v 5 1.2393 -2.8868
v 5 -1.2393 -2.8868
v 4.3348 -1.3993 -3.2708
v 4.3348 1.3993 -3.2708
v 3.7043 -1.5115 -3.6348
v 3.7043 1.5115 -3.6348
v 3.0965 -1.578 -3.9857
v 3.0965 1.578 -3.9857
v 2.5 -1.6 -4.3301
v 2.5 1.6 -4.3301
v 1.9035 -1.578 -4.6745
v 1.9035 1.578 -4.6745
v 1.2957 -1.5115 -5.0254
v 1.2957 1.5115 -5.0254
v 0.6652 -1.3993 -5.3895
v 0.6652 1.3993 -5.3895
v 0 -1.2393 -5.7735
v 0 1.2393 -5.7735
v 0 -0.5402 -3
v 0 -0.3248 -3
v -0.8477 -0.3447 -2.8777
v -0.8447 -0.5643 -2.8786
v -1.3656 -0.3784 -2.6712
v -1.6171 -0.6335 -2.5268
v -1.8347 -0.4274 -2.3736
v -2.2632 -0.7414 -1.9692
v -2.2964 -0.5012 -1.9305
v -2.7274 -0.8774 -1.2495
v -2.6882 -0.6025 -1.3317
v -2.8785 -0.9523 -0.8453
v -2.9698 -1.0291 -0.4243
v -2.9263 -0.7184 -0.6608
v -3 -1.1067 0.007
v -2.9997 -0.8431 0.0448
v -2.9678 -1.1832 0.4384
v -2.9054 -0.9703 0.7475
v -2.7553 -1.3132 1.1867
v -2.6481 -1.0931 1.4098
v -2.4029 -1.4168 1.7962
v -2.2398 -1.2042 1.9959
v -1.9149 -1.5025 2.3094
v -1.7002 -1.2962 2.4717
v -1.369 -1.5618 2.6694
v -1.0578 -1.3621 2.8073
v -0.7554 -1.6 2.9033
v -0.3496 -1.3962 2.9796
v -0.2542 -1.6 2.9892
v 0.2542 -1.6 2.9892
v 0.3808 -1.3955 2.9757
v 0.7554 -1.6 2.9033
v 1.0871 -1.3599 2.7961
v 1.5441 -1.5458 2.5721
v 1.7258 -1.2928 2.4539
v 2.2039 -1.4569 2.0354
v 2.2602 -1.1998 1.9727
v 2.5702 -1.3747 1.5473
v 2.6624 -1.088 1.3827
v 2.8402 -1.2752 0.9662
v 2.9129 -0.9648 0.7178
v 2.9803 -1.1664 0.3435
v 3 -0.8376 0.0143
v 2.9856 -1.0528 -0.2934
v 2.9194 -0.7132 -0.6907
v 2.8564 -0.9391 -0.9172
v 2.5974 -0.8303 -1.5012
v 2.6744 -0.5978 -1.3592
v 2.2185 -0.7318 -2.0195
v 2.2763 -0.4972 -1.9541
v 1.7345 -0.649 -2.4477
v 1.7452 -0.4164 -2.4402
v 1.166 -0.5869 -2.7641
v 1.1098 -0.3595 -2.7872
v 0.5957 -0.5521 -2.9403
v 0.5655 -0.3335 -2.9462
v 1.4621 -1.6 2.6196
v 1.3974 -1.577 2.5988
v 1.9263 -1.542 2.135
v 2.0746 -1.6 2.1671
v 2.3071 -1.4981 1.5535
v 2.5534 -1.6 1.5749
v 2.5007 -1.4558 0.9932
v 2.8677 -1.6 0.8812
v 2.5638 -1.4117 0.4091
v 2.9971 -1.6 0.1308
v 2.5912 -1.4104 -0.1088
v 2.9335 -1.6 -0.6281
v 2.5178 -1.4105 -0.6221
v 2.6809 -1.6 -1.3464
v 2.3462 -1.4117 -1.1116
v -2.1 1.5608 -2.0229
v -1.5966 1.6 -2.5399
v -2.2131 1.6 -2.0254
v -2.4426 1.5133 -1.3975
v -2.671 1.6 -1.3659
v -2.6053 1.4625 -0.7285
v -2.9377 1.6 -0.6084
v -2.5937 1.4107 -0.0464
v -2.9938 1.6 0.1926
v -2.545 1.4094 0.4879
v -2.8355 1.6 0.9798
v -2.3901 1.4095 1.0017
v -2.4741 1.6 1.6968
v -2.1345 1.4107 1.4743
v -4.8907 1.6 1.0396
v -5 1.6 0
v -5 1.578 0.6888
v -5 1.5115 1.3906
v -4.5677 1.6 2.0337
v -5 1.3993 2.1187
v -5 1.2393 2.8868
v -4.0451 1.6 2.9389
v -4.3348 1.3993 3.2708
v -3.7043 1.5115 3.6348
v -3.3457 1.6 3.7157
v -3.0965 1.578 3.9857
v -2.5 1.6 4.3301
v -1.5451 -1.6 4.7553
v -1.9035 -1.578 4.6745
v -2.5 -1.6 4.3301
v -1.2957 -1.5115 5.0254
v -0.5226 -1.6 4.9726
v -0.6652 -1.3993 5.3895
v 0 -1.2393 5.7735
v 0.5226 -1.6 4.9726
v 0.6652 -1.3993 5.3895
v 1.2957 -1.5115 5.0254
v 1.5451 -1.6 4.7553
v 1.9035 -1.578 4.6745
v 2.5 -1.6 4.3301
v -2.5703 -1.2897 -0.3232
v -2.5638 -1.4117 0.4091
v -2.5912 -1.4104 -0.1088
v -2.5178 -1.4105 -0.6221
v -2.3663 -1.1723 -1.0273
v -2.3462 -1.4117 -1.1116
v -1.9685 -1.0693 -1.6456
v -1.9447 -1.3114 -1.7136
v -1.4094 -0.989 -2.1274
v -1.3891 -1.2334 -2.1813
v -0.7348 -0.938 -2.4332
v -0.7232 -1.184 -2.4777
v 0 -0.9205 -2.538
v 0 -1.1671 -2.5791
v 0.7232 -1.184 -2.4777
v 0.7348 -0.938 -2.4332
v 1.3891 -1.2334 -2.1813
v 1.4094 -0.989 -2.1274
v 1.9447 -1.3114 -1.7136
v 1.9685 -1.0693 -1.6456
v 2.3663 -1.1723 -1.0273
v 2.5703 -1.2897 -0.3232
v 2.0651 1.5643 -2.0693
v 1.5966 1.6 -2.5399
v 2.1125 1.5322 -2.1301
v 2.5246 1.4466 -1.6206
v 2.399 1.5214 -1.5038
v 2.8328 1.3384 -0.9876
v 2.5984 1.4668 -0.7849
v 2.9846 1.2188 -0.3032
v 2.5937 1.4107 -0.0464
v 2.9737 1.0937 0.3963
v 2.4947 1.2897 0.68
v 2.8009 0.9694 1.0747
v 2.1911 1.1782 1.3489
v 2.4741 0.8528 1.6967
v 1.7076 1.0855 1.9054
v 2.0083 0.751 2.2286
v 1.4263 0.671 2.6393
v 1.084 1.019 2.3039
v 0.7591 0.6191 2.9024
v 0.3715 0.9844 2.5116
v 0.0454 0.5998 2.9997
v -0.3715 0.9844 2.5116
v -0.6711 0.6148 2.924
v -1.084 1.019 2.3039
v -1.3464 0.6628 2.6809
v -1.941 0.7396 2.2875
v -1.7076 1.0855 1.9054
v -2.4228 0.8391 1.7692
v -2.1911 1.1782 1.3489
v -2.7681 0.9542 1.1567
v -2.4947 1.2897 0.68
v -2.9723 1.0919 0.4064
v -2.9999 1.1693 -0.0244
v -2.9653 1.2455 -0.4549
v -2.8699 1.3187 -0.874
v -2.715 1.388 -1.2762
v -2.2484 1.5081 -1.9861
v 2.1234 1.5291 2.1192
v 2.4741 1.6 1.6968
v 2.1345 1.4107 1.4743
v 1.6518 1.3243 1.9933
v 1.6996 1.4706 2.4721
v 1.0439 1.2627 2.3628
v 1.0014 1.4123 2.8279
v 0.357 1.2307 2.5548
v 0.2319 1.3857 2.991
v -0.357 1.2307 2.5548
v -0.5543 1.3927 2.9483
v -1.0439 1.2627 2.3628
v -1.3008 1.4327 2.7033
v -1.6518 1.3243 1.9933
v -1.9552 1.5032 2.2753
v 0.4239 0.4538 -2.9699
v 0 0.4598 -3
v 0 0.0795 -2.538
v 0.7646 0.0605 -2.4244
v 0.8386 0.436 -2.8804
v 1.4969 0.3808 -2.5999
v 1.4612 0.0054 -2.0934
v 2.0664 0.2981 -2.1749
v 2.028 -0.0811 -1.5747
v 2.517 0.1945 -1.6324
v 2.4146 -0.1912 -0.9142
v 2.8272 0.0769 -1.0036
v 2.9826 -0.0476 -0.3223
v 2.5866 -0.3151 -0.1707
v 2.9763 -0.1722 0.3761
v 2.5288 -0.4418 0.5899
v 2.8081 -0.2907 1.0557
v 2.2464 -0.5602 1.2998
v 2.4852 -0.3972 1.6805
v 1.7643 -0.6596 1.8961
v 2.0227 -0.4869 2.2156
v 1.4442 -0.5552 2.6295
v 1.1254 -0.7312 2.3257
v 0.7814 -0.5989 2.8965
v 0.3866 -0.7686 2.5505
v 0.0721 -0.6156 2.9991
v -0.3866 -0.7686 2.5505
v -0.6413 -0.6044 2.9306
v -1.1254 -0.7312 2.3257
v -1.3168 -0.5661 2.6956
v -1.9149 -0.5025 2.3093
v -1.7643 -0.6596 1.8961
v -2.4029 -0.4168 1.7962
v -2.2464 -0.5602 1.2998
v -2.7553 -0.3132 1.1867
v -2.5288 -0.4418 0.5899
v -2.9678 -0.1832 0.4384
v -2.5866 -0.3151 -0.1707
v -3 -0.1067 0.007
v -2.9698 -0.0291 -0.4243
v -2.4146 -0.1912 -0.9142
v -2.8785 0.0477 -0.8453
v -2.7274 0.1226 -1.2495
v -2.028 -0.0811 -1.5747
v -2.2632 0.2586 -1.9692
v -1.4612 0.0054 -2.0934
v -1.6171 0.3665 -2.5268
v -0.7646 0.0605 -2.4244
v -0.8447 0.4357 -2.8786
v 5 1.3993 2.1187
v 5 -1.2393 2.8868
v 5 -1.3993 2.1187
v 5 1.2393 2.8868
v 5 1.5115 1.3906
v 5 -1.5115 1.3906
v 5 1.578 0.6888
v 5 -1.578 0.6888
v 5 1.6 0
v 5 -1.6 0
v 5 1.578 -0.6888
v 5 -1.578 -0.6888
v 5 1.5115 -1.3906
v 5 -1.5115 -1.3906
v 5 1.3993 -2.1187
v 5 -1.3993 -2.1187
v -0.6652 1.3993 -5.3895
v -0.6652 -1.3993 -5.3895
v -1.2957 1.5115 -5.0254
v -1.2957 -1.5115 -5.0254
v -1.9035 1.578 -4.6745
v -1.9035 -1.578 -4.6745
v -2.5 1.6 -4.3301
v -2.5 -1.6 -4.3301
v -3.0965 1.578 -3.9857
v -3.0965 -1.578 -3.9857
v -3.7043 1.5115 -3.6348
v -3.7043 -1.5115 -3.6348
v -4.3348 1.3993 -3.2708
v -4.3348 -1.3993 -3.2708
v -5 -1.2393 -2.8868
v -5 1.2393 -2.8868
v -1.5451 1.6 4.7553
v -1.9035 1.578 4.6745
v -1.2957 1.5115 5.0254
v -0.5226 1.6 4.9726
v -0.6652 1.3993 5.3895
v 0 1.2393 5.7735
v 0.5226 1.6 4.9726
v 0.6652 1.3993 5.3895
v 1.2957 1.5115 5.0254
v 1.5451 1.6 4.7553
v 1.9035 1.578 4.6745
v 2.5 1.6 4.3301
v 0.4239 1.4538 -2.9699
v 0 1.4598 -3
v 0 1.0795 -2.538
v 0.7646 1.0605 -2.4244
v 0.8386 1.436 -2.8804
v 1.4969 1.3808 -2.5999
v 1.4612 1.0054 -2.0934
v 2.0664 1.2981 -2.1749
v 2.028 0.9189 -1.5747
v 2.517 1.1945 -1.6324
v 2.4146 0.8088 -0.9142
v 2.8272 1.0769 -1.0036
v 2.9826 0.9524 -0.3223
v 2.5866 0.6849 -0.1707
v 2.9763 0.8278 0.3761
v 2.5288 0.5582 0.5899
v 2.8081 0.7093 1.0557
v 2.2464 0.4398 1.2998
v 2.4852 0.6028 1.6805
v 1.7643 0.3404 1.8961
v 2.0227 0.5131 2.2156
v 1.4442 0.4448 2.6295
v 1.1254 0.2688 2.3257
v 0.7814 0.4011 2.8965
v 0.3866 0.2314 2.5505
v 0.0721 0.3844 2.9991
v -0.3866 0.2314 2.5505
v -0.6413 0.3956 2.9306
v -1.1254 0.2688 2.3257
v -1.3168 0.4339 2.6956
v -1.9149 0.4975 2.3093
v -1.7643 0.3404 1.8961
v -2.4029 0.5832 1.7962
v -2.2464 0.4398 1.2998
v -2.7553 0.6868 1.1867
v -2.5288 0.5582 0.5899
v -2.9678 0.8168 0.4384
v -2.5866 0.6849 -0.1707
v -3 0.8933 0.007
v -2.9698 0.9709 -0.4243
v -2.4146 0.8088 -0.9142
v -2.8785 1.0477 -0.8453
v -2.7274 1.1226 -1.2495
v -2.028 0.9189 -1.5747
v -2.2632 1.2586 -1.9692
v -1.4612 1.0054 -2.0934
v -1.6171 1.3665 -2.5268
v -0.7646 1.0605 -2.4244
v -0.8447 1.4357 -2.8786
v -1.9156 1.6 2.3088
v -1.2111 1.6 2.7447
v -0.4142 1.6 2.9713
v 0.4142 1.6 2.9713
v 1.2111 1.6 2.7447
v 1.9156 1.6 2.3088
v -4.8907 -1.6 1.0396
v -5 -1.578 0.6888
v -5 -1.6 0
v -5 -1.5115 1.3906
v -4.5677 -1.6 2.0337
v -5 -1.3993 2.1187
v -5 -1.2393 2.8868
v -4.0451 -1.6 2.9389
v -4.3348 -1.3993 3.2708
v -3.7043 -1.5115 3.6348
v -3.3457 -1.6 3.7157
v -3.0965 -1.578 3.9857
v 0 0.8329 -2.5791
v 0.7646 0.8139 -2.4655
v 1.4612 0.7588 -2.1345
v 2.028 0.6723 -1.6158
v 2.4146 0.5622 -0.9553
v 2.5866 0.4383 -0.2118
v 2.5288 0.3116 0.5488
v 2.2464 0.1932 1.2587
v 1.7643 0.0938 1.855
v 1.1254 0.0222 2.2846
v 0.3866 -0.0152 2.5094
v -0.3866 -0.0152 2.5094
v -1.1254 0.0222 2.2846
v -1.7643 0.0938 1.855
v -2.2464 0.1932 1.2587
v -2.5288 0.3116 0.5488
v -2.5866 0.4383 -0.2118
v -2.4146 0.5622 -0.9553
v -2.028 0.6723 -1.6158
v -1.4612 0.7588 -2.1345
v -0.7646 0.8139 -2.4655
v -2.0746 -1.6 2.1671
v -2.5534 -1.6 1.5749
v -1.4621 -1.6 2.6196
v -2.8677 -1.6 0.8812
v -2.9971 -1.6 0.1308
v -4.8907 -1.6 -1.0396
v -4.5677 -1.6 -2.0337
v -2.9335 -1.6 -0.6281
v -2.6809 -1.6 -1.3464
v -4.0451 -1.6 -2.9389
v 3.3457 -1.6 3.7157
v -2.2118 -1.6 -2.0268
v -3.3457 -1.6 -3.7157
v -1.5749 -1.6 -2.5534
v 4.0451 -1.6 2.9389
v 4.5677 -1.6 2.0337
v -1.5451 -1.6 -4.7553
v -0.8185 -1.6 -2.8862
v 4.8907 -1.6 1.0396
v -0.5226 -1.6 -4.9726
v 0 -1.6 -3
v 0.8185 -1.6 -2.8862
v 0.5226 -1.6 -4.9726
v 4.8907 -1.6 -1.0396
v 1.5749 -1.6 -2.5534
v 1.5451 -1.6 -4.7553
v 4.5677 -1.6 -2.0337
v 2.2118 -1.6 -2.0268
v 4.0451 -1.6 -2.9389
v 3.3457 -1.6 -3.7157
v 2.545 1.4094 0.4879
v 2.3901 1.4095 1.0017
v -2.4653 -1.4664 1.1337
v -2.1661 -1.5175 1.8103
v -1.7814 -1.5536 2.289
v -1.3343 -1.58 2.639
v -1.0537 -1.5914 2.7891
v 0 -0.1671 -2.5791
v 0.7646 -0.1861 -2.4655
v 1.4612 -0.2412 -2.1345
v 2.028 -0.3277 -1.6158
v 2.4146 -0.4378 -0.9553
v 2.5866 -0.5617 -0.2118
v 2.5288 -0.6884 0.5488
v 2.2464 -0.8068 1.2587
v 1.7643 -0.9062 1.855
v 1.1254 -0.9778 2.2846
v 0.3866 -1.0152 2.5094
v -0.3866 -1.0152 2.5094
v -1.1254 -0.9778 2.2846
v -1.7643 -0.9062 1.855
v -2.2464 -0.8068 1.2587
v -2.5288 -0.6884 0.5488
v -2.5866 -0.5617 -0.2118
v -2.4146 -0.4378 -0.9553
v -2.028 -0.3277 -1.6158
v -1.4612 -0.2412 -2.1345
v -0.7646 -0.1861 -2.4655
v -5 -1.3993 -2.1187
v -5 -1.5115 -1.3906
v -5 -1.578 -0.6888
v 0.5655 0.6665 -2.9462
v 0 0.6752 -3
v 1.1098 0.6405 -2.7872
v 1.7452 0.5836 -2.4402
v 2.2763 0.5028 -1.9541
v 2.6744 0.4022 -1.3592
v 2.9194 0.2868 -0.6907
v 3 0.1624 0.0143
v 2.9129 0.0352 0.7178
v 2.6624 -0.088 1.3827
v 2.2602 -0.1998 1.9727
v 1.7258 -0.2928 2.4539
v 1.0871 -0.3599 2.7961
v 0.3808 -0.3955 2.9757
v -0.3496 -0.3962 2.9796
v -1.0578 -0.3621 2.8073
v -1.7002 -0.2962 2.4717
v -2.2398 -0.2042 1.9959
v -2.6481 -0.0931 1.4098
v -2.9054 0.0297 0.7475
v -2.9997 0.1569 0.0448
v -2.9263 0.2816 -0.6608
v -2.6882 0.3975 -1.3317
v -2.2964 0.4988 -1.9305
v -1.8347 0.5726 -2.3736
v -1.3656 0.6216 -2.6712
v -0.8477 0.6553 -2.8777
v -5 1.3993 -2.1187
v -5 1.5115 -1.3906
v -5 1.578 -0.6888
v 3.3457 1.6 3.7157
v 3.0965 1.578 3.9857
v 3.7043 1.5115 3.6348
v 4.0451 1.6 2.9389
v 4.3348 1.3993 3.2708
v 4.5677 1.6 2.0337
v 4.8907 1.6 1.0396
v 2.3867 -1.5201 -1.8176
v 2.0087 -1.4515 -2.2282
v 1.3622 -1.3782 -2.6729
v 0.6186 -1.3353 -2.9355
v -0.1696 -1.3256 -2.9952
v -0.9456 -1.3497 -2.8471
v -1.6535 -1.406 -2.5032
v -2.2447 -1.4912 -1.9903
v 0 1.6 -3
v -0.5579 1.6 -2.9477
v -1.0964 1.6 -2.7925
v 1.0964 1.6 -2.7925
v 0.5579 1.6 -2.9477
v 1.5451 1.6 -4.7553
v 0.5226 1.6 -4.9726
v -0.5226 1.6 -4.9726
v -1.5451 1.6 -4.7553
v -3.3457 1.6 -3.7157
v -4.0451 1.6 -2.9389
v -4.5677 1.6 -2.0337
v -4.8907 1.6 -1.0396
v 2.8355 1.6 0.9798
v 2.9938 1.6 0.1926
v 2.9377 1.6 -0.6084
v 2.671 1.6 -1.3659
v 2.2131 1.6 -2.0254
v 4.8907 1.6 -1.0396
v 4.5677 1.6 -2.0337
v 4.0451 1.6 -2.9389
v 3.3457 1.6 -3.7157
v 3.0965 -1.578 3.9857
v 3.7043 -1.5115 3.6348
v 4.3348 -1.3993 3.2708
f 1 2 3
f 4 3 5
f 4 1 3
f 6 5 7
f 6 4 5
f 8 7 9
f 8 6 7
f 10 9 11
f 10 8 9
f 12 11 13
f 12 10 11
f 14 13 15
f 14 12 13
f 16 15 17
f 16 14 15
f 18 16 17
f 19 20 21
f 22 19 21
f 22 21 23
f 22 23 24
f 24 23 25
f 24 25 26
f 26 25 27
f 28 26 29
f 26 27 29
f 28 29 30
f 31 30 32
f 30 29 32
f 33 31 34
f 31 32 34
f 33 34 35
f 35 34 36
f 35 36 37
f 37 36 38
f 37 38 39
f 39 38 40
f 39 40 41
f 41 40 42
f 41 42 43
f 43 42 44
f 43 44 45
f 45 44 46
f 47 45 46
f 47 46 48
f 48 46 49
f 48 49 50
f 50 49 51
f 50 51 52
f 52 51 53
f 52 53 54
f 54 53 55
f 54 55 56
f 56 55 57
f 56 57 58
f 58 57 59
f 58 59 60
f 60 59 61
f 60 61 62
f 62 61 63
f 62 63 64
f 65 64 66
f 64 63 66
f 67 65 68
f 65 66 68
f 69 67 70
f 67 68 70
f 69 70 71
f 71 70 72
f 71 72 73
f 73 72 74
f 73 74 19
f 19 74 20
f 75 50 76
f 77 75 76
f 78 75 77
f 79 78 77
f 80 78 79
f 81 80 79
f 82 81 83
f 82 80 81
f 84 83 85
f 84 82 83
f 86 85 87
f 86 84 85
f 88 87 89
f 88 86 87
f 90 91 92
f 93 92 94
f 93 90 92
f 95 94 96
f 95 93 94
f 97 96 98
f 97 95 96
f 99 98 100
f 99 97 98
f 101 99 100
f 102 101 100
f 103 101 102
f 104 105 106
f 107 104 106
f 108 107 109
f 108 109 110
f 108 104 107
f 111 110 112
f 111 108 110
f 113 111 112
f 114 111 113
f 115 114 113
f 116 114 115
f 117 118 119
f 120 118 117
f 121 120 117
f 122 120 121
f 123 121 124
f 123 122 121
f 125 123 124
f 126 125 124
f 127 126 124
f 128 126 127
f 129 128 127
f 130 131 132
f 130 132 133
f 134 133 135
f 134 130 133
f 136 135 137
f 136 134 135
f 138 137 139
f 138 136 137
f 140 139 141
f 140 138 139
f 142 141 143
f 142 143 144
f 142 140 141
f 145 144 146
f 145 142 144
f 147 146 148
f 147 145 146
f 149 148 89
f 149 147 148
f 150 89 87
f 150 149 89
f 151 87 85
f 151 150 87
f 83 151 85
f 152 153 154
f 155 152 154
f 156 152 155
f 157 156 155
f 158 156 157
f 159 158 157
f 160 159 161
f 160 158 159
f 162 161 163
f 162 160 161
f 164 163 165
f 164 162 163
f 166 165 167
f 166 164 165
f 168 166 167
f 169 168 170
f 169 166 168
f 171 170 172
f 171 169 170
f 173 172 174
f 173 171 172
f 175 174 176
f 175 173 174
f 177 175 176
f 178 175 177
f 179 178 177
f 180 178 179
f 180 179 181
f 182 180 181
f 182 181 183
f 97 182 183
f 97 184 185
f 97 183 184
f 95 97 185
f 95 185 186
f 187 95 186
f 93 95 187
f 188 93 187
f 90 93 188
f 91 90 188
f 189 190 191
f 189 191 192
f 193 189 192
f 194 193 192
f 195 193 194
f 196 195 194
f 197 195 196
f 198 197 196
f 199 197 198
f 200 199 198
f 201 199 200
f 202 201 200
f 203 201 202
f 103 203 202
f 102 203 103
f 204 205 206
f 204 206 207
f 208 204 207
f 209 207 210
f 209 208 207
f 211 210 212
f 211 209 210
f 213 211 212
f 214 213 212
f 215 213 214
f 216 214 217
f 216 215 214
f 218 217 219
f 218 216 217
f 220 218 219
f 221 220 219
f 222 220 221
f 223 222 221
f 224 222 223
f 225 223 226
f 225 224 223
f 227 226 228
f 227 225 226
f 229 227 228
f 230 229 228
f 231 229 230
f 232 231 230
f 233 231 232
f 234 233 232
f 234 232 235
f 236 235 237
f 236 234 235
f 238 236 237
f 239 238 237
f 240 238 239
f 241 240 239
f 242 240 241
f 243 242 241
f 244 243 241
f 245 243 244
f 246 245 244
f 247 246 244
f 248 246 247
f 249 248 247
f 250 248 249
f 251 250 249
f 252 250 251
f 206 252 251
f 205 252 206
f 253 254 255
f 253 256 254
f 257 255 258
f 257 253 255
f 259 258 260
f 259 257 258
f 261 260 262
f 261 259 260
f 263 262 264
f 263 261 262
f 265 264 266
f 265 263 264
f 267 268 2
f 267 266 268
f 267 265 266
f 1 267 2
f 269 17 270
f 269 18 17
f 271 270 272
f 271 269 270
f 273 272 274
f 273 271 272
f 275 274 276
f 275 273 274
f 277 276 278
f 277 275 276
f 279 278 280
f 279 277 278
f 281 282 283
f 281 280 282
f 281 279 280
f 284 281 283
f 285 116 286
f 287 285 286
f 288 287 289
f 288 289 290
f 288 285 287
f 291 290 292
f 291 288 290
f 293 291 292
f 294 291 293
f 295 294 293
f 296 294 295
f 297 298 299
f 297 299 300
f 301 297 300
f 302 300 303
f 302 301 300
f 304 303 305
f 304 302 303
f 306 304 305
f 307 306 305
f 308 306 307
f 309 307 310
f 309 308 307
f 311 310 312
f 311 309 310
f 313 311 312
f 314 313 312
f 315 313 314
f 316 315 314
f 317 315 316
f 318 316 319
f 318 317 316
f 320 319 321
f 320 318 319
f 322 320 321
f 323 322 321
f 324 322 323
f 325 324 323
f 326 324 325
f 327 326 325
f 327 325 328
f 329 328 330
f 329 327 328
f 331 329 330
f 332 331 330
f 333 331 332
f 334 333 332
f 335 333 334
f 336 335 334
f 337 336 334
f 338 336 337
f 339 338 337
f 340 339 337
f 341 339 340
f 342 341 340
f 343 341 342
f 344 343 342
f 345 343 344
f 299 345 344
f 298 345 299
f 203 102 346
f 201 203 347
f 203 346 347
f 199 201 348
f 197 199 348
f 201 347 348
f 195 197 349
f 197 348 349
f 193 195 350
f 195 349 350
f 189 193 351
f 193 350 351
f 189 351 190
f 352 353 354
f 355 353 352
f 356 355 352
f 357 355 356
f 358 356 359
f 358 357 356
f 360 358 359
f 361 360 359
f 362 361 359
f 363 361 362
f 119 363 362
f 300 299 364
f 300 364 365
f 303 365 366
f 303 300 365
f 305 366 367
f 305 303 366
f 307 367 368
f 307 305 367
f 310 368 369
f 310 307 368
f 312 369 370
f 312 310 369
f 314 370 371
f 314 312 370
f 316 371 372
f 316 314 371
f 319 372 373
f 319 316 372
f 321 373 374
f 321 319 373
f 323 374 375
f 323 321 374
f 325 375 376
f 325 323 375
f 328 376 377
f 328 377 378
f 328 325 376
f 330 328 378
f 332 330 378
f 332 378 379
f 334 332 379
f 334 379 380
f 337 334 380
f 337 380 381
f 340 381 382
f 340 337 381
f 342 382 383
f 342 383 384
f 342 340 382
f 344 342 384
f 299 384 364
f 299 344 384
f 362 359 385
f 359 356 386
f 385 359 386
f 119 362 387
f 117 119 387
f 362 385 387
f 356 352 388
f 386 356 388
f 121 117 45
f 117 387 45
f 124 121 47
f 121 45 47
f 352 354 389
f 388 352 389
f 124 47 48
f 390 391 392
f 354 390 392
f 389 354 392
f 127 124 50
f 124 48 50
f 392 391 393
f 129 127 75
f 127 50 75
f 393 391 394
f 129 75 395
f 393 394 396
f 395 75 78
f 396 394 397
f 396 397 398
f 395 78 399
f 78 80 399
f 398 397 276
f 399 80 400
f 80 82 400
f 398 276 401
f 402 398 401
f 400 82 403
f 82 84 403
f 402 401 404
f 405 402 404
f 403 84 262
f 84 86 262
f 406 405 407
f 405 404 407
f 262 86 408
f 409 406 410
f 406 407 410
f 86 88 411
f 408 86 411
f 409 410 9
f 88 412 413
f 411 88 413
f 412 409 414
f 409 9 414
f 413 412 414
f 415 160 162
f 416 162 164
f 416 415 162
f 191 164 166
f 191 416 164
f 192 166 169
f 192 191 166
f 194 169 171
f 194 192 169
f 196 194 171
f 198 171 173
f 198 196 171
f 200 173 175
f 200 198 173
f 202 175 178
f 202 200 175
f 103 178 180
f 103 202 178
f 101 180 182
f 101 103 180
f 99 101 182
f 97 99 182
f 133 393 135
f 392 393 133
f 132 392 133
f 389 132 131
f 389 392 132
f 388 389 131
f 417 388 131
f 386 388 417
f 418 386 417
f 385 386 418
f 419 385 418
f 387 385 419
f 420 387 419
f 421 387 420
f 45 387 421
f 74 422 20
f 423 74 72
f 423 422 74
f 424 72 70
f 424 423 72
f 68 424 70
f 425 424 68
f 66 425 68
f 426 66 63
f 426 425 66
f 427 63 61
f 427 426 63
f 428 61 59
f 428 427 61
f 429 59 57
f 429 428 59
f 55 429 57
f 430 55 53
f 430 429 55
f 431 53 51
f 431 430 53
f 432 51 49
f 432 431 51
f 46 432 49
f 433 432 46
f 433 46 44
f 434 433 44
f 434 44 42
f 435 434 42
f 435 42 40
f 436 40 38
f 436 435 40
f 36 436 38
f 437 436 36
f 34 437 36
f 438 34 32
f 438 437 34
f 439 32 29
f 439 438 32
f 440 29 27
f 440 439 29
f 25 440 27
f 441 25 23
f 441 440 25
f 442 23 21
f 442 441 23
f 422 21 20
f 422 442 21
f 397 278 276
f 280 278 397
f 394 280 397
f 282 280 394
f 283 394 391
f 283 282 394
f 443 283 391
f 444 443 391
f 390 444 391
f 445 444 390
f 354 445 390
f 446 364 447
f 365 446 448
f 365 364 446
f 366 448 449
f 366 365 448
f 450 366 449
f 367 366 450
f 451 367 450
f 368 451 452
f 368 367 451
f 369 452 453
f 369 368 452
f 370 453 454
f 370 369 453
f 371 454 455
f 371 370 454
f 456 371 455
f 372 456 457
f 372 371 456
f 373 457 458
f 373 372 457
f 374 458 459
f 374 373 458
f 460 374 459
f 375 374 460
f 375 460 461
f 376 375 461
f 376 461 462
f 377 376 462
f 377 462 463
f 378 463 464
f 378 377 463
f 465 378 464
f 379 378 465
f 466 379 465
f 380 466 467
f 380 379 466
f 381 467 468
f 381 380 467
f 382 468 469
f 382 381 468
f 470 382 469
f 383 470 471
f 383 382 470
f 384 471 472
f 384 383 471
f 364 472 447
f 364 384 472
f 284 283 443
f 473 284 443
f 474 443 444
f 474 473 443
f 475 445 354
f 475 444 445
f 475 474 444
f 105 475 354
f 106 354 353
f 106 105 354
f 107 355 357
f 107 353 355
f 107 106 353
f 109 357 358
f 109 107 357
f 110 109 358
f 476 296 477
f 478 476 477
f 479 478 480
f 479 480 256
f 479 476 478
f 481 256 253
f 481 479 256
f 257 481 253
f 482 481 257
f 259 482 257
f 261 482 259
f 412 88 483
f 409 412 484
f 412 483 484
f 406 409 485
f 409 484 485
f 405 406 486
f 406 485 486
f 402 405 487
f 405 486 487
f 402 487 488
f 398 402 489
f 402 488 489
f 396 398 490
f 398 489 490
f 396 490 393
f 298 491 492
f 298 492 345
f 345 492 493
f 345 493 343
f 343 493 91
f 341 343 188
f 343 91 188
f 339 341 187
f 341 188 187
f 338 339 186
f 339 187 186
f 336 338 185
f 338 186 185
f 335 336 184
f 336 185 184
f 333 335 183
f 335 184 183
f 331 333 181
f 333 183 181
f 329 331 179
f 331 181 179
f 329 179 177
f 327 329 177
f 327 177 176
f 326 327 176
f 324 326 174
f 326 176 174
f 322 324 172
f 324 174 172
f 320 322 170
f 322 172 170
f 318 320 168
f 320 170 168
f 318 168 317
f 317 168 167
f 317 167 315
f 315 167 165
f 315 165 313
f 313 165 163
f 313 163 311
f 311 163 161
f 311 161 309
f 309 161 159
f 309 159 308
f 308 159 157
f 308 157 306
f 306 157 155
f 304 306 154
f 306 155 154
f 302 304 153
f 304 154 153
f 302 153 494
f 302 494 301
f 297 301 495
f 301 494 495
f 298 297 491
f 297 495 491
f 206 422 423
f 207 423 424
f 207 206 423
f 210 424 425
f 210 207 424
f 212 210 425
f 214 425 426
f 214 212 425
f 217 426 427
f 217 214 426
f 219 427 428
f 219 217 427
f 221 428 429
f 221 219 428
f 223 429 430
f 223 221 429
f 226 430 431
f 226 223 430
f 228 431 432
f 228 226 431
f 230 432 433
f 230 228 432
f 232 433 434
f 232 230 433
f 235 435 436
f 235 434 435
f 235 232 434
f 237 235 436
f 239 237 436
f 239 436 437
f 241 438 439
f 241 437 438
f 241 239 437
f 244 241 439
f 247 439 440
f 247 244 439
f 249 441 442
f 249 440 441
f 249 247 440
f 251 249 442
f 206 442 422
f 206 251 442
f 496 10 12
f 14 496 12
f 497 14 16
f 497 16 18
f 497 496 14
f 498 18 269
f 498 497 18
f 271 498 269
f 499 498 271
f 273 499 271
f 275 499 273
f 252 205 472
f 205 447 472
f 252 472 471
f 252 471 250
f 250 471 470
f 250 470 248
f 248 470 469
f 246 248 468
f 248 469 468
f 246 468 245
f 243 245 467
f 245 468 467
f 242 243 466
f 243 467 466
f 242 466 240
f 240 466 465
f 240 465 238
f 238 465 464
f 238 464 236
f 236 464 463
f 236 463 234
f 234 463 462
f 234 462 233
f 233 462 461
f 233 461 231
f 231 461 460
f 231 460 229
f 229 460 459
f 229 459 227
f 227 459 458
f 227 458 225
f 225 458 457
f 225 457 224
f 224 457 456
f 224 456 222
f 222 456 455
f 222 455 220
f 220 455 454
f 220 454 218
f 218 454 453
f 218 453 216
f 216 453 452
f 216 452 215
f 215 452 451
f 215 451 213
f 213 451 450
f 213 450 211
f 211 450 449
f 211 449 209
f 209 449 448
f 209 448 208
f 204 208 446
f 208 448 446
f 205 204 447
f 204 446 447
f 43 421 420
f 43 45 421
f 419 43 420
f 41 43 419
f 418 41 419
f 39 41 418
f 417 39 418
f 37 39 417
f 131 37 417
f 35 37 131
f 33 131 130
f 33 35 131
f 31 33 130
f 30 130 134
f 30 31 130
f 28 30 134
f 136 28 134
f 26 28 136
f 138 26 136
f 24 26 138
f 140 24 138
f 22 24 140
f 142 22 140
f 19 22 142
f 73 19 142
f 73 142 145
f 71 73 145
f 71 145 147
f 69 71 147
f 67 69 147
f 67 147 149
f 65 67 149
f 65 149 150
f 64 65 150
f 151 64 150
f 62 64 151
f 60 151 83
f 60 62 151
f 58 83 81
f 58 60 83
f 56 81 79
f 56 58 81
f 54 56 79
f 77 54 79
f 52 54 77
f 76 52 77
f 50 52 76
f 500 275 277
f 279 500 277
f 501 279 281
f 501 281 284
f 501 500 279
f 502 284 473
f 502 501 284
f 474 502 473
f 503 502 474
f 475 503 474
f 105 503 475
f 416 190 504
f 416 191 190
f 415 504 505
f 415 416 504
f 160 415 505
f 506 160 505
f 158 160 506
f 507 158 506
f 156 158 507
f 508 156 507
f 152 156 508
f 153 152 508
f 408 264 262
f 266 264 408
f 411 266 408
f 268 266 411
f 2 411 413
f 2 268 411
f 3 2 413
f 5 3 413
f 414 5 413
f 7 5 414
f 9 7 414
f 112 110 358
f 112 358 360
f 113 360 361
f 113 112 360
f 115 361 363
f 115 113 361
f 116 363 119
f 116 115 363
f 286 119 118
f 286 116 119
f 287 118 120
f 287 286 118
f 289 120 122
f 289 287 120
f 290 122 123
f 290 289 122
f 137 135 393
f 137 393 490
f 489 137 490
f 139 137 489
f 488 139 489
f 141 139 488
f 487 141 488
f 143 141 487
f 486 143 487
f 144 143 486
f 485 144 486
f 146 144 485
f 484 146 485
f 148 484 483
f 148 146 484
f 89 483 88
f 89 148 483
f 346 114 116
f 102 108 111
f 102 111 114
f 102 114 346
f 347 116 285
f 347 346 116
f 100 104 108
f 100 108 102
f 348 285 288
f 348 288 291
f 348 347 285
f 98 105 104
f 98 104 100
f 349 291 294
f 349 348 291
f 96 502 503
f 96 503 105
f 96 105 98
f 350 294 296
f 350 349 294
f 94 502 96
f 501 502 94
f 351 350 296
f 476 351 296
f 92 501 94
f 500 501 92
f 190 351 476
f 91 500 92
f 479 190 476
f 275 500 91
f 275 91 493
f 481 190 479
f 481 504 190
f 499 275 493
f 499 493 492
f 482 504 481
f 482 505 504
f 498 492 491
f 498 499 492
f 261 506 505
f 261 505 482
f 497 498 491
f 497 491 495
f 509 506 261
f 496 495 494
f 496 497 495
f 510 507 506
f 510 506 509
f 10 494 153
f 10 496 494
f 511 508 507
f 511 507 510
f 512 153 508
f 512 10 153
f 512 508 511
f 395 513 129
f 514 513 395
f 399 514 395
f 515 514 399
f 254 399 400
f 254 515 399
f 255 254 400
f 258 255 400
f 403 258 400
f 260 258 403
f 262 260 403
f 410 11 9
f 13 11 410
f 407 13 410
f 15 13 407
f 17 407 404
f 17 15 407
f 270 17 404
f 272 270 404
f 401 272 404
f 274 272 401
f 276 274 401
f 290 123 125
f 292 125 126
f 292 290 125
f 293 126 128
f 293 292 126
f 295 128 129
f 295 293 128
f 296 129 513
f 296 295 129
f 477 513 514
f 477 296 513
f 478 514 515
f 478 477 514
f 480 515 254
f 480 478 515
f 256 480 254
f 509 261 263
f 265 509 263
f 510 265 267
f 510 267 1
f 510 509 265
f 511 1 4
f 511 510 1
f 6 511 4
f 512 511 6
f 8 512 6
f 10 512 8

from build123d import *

# Parameters (mm, degrees)
EXTRUDE1_DEPTH      = 1.6
SKETCH2_W           = 3
SKETCH2_H           = 3.2
LPATTERN1_COUNT     = 3
LPATTERN1_PITCH     = 1
LPATTERN1_COL_COUNT = 2
LPATTERN1_COL_PITCH = 1


with BuildPart() as part:
    # Sketch1 → Extrude1 (new body, symmetric)
    with BuildSketch(Plane(origin=(0, 0, 0), x_dir=(1, 0, 0), z_dir=(0, 1, 0))):
        Polygon((0, 5.773502692), (-5, 2.886751346), (-5, -2.886751346), (0, -5.773502692), (5, -2.886751346), (5, 2.886751346), align=None)
    extrude(amount=EXTRUDE1_DEPTH, both=True)

    # Sketch4 → Cut-Revolve2 (revolve, cut)
    with BuildSketch(Plane(origin=(0, 0, 0), x_dir=(0, 0, -1), z_dir=(1, 0, 0))):
        Polygon((0, 1.6), (3, 1.6), (2.538023184, 1.384576673), (2.538023184, -1.384576673), (3, -1.6), (0, -1.6), align=None)
    revolve(axis=Axis((0, 1.6, 0), (0, 1, 0)), mode=Mode.SUBTRACT)


with BuildPart() as body_2:
    # Sketch2 → Revolve1 (revolve)
    with BuildSketch(Plane(origin=(0, 0, 0), x_dir=(0, 0, -1), z_dir=(1, 0, 0))):
        with Locations((1.5, 0)):
            Rectangle(SKETCH2_W, SKETCH2_H)
    revolve(axis=Axis((0, -4.6, 0), (0, 1, 0)))

    # Sketch3 → Cut-Revolve1 (revolve, cut)
    with BuildSketch(Plane(origin=(0, 0, 0), x_dir=(0, 0, -1), z_dir=(1, 0, 0))):
        Polygon((3.020549873, 1.47670076), (3.164398987, 0.613606076), (2.579122931, 0.832870615), (2.538023184, 1.079469096), align=None)
    cut_revolve1 = revolve(axis=Axis((0, 1.6, 0.178376498), (0, -0.986393924, -0.164398987)), mode=Mode.SUBTRACT)

    # LPattern1: Cut-Revolve1 ×3
    with Locations(*[(0, -i * LPATTERN1_PITCH, 0) for i in range(1, LPATTERN1_COUNT)]):
        add(cut_revolve1, mode=Mode.SUBTRACT)

    # LPattern1 col: Cut-Revolve1 ×2
    with Locations(*[(0, i * LPATTERN1_COL_PITCH, 0) for i in range(1, LPATTERN1_COL_COUNT)]):
        add(cut_revolve1, mode=Mode.SUBTRACT)


with BuildPart() as part_1:
    add(part.part)

    # Combine1: cut body 2
    add(body_2.part, mode=Mode.SUBTRACT)

    # Sketch5 → Cut-Revolve3 (revolve, cut)
    with BuildSketch(Plane(origin=(0, 0, 0), x_dir=(0, 0, -1), z_dir=(1, 0, 0))):
        Polygon((0, -1.6), (5, -1.6), (5.773502692, -1.239309771), (5.773502692, 1.239309771), (5, 1.6), (0, 1.6), (0, 2.87), (7.043502692, 2.87), (7.043502692, -2.87), (0, -2.87), align=None)
    revolve(axis=Axis((0, -1.6, 0), (0, 1, 0)), mode=Mode.SUBTRACT)


solid = part_1.part
